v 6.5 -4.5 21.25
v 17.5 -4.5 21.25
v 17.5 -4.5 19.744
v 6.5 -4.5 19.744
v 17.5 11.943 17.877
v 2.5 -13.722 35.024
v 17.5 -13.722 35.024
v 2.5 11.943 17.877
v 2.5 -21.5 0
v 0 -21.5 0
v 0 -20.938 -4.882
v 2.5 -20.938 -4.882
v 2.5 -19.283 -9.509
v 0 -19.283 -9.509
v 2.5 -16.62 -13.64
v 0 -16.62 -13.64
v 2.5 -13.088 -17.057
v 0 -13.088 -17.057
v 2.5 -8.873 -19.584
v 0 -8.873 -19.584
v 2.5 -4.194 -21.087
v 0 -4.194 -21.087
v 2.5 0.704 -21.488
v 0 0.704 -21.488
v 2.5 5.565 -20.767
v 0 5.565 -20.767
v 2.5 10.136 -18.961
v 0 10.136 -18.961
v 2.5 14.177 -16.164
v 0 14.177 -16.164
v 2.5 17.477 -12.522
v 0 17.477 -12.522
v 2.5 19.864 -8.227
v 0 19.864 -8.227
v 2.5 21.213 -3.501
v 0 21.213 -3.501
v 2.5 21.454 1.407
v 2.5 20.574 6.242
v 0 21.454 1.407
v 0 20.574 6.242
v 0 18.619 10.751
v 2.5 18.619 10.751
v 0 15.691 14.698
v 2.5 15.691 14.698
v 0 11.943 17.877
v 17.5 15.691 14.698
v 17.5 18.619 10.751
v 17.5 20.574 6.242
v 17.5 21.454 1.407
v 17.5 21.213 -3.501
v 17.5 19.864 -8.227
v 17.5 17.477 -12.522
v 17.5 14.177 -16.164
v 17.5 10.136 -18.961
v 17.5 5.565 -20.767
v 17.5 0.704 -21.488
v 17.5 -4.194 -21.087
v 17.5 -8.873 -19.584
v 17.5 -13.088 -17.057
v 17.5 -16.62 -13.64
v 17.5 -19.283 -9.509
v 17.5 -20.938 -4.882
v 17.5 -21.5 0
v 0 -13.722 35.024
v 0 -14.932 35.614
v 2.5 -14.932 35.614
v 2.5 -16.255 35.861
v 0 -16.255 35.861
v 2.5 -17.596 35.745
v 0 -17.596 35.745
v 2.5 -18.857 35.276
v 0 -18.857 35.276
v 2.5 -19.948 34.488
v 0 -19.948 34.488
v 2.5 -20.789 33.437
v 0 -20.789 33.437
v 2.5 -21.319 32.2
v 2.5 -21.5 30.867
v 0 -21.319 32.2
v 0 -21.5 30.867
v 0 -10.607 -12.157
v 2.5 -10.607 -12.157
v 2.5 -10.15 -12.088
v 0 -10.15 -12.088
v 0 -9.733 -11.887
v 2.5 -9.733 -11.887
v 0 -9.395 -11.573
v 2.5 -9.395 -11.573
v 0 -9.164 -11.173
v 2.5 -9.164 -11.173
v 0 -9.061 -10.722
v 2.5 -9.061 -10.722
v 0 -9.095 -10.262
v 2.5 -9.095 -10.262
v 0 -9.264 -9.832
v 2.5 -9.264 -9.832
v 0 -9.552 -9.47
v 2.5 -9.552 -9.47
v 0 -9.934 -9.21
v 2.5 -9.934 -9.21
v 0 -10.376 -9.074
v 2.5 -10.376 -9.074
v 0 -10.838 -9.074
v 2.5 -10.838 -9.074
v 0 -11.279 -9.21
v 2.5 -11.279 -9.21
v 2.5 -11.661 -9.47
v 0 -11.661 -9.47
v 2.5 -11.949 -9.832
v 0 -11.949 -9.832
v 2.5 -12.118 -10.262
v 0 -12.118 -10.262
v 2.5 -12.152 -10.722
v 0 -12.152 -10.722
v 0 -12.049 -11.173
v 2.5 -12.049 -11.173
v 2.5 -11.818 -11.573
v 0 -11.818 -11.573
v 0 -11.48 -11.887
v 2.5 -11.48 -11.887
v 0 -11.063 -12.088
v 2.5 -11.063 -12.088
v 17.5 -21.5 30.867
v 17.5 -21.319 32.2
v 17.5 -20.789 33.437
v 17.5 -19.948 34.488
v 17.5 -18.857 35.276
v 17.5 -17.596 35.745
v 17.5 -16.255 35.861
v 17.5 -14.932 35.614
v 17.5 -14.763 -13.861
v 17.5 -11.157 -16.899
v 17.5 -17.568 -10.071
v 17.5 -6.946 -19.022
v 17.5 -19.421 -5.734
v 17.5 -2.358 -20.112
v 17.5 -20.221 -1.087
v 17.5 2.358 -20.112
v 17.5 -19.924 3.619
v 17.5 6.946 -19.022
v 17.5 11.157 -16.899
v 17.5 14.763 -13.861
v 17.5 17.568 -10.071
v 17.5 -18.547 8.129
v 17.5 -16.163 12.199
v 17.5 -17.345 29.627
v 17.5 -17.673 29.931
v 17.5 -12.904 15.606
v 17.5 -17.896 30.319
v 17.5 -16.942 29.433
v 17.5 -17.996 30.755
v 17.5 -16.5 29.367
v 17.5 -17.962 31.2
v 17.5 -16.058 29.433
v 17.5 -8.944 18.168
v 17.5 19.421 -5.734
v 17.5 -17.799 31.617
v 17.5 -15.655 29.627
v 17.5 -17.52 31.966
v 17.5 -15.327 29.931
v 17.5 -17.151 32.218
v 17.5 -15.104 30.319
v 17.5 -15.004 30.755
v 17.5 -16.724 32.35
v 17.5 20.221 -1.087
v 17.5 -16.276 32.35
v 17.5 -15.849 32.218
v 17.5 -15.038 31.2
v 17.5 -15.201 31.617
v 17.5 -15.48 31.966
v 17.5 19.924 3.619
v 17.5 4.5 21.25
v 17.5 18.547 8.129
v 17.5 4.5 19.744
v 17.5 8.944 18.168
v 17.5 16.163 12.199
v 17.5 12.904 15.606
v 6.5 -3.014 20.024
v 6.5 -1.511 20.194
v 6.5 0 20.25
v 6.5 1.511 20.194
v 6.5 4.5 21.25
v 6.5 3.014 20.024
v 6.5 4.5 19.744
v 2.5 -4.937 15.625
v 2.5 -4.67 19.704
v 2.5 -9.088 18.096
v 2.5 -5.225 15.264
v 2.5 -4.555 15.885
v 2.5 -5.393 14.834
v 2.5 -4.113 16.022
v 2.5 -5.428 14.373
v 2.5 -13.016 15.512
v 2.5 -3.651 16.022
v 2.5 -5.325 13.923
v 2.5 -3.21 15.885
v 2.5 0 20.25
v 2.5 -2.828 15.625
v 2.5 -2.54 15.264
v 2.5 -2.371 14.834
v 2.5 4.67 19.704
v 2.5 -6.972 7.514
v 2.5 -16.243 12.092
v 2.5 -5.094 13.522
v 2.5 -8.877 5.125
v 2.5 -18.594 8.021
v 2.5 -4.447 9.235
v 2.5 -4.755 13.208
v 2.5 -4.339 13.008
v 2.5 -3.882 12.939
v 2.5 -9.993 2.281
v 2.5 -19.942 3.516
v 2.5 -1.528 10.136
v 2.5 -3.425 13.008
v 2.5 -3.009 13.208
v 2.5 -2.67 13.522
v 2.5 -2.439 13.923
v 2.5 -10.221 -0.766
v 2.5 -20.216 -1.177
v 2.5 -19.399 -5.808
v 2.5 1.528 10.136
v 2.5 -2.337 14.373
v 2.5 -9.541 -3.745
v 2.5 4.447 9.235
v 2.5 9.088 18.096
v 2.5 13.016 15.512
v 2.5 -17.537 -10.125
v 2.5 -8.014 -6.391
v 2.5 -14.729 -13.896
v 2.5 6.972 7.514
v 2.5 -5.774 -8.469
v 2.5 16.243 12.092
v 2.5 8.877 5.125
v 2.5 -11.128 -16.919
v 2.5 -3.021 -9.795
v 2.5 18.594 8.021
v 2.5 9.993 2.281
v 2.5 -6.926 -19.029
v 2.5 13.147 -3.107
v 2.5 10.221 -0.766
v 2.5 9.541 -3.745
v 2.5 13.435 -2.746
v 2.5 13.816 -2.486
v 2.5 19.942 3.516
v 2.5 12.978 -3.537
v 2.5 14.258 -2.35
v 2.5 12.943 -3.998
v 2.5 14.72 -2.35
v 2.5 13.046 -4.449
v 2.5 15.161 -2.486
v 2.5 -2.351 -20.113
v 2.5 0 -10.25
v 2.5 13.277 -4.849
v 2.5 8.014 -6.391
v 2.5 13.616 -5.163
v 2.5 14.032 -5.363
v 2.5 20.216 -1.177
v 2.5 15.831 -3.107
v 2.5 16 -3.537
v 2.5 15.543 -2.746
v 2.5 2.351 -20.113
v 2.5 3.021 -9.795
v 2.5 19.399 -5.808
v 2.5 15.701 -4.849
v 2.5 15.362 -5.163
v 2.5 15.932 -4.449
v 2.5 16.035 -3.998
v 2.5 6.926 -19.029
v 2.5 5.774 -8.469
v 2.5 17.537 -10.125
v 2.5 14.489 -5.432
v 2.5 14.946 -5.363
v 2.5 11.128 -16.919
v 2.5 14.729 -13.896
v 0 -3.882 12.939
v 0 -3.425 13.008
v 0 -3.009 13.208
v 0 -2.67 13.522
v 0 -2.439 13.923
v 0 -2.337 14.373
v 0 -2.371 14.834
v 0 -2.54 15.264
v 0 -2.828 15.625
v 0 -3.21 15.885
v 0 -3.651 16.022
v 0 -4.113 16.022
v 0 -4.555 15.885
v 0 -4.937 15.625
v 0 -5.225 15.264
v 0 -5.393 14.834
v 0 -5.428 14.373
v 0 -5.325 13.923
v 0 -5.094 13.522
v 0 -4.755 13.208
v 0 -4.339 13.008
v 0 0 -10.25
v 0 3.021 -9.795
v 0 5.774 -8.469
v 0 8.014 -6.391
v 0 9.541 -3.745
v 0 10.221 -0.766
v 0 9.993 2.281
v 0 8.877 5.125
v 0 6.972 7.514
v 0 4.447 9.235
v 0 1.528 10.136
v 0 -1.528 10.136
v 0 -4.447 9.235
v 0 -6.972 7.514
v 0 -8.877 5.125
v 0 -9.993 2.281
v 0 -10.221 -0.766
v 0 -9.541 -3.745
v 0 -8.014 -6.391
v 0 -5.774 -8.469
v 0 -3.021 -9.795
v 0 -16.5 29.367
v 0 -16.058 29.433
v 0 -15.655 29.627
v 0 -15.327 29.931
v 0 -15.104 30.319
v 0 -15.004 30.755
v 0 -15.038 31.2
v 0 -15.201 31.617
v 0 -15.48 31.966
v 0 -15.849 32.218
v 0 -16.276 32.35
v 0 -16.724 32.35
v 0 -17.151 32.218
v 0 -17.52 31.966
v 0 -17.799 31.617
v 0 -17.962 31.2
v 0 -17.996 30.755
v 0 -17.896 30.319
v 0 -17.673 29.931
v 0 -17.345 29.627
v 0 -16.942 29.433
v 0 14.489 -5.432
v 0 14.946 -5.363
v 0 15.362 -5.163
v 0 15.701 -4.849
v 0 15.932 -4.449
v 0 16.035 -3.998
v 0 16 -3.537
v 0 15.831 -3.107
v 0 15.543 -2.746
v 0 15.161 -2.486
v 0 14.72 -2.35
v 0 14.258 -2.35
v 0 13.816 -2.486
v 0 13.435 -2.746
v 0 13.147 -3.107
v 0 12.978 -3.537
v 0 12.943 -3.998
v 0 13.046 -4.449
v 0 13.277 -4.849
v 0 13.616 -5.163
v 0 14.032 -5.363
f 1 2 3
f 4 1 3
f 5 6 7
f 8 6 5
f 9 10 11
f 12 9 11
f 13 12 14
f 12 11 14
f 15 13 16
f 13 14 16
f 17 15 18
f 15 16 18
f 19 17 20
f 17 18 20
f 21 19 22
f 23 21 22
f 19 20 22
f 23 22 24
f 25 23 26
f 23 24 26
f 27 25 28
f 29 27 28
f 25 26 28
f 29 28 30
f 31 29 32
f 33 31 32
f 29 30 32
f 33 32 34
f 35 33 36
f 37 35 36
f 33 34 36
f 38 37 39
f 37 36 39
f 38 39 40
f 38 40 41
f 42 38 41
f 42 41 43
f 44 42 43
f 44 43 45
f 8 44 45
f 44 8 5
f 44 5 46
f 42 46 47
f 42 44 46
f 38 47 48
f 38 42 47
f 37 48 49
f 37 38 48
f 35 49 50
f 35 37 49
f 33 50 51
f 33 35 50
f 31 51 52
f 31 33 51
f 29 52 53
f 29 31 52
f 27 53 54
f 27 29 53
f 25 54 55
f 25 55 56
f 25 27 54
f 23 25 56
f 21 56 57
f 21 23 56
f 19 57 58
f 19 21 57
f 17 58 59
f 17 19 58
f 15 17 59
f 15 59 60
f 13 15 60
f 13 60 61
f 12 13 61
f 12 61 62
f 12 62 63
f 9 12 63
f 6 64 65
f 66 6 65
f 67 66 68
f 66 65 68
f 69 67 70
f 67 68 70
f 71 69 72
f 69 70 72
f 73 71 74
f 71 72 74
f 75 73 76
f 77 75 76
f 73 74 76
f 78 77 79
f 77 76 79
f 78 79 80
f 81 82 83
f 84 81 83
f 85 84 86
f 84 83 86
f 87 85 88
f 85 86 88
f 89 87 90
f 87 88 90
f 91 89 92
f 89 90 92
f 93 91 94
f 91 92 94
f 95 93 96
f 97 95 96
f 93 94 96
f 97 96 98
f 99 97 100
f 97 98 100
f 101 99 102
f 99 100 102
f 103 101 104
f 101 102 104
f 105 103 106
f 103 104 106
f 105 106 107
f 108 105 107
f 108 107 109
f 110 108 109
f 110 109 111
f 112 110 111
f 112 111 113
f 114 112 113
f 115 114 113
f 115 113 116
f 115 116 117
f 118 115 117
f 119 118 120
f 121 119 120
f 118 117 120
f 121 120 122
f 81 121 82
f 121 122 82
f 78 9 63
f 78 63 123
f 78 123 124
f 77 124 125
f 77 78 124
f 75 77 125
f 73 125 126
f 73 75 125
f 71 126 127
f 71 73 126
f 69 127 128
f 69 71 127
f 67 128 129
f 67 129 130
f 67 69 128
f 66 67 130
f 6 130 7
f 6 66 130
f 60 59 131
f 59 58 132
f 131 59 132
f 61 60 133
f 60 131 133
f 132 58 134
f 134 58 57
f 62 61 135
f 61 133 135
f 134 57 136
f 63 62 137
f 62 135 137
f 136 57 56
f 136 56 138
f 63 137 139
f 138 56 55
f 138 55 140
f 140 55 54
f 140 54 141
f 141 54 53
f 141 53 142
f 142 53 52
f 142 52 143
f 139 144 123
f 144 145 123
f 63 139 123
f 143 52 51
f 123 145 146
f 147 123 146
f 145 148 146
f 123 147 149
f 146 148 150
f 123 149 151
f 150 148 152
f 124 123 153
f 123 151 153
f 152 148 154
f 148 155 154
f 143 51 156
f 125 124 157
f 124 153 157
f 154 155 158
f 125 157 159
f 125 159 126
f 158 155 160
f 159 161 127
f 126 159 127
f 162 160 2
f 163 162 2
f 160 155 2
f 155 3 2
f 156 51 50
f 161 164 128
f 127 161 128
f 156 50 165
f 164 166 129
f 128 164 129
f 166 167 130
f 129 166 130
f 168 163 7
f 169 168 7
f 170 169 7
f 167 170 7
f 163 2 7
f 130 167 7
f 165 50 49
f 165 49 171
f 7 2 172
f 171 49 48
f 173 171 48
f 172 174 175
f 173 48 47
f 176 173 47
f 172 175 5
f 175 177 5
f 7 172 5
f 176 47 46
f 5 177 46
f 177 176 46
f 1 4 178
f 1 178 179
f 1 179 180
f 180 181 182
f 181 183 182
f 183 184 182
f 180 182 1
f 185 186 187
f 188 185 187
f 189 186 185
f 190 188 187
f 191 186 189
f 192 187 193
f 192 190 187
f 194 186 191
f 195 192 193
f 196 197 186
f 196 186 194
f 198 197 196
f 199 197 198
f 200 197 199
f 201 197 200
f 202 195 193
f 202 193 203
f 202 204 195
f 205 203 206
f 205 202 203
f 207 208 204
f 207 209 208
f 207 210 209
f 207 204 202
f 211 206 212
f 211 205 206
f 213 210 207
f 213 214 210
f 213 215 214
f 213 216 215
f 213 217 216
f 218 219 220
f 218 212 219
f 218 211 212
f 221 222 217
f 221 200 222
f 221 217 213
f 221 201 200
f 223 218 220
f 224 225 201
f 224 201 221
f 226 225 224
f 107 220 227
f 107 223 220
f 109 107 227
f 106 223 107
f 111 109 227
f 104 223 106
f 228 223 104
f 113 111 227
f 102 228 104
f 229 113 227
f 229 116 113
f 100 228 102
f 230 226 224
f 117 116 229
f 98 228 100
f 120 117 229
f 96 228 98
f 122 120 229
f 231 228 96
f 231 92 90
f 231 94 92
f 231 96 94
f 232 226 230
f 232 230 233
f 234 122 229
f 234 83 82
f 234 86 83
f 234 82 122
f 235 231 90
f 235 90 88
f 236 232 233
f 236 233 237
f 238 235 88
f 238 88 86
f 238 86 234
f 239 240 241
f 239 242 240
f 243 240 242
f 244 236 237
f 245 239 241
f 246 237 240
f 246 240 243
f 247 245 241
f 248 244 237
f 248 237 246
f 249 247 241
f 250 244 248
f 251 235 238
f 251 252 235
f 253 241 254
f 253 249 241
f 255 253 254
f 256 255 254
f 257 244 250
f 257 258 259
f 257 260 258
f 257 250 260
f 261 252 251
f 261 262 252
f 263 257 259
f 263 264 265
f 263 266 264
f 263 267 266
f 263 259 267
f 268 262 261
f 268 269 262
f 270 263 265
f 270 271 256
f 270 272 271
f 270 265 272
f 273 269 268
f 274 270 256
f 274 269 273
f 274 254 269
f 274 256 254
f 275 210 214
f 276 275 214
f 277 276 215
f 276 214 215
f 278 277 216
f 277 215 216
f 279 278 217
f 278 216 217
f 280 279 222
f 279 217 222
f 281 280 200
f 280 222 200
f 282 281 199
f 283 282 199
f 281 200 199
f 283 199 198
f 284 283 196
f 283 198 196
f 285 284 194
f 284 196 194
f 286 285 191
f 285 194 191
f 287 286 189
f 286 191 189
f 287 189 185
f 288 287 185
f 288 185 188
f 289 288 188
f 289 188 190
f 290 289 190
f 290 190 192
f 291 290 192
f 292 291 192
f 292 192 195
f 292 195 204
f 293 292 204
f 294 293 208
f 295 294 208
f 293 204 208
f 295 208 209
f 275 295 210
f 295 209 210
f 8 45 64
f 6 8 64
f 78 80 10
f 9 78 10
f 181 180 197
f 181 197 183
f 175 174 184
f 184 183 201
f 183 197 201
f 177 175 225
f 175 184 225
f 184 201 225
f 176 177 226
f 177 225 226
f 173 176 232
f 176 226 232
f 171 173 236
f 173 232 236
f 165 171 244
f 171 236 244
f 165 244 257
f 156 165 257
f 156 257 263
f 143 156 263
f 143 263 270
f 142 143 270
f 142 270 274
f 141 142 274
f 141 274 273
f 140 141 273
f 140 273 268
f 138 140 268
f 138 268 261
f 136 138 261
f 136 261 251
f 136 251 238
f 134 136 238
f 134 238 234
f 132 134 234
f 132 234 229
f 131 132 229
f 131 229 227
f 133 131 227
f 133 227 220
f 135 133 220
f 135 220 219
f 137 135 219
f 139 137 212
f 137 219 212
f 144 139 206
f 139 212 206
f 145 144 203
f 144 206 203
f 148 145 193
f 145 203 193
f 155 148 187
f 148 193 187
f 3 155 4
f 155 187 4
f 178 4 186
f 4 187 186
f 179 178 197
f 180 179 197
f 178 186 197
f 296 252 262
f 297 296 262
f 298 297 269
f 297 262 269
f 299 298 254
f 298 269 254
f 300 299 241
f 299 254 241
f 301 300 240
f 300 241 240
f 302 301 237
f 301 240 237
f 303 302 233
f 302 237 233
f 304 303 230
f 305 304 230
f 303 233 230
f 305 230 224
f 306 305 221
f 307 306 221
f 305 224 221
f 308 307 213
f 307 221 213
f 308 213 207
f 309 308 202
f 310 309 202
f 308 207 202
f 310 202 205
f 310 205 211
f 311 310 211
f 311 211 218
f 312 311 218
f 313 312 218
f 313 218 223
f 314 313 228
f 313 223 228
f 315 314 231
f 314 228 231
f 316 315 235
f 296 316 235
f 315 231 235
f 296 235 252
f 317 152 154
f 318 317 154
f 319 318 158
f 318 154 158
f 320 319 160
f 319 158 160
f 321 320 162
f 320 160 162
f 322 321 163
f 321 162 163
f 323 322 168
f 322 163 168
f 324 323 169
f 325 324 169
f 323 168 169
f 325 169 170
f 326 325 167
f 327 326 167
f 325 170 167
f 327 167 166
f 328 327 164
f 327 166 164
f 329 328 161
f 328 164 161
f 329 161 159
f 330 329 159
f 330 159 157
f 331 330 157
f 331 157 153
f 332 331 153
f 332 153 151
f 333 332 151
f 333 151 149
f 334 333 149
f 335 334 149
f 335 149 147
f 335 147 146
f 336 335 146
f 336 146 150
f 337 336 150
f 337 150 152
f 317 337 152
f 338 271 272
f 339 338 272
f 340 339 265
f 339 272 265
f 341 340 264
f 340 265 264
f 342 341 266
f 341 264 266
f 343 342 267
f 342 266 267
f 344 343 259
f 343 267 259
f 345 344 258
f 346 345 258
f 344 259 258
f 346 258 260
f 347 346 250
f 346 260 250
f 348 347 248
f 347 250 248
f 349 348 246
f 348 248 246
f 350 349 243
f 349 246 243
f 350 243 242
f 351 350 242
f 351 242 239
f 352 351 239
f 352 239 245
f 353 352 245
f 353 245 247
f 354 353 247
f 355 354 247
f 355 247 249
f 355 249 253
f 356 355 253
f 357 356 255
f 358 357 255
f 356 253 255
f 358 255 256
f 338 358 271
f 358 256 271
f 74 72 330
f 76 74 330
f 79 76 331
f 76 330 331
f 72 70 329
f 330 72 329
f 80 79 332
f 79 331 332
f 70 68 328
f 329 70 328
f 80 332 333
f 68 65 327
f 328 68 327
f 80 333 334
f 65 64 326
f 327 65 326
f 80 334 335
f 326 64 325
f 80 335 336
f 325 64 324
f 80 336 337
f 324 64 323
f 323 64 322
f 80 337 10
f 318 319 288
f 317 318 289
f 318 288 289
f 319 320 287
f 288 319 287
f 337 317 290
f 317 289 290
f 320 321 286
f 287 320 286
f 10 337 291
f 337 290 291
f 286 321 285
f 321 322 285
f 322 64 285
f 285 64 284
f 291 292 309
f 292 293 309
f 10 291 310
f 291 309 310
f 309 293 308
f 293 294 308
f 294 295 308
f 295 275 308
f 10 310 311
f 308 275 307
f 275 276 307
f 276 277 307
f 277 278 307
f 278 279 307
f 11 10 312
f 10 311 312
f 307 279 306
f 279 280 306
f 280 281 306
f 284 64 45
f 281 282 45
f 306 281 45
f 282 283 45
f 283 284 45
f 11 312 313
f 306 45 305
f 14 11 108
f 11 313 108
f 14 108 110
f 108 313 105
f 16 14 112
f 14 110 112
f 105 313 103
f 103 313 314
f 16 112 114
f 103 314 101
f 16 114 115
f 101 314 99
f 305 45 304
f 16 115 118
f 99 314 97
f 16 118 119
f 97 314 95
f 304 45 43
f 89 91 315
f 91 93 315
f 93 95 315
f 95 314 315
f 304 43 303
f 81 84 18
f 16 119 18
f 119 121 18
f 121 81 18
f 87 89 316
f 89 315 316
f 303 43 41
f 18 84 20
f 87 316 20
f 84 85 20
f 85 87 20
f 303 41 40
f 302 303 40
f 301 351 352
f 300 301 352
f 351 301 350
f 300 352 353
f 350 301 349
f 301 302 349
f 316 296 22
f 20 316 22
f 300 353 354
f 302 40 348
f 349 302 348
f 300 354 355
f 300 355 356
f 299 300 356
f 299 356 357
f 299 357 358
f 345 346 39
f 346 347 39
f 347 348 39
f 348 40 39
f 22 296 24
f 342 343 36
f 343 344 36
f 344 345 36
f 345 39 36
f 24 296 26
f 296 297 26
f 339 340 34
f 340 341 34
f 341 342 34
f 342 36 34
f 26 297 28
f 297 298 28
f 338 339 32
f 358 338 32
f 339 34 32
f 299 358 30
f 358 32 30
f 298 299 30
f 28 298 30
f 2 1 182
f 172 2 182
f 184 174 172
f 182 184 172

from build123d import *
from build123d.topology import SkipClean

# Parameters (mm, degrees)
EXTRUDE_1_DEPTH     = 2.5
SKETCH_3_R          = 10.25
SKETCH_3_R_2        = 1.55
CUT_EXTRUDE_1_DEPTH = 2.5
SKETCH_2_R          = 20.25
EXTRUDE_2_DEPTH     = 15
SKETCH_4_R          = 1.5
CUT_EXTRUDE_2_DEPTH = 46.33118669
CUT_EXTRUDE_3_DEPTH = 11


with BuildPart() as part:
    # Эскиз1 → Бобышка-Вытянуть1 (new body)
    with BuildSketch(Plane(origin=(0, 0, 0), x_dir=(0, 0, -1), z_dir=(1, 0, 0))):
        with BuildLine():
            Line((-30.866648668, -21.5), (0, -21.5))
            ThreePointArc((0, -21.5), (18.960941325, 10.135714286), (-17.877458963, 11.943469388))
            Line((-17.877458963, 11.943469388), (-35.024197264, -13.72244898))
            ThreePointArc((-35.024197264, -13.72244898), (-35.276169906, -18.857142857), (-30.866648668, -21.5))
        make_face()
    extrude(amount=EXTRUDE_1_DEPTH)

    # Эскиз3 → Вырез-Вытянуть1 (cut)
    with BuildSketch(Plane(origin=(2.5, 0, 0), x_dir=(0, 0, -1), z_dir=(1, 0, 0))):
        Circle(SKETCH_3_R)
        with Locations((3.882285677, 14.488887394)):
            Circle(SKETCH_3_R_2)
        with Locations((10.606601718, -10.606601718)):
            Circle(SKETCH_3_R_2)
        with Locations((-14.488887394, -3.882285677)):
            Circle(SKETCH_3_R_2)
    extrude(amount=-CUT_EXTRUDE_1_DEPTH, mode=Mode.SUBTRACT)

    # Эскиз2 → Бобышка-Вытянуть2 (add)
    with SkipClean():  # the faces are left unmerged after this step: merging them gives an invalid solid
        with BuildSketch(Plane.ZY.offset(-2.5)):
            with BuildLine():
                Line((0, -21.5), (30.866648668, -21.5))
                ThreePointArc((30.866648668, -21.5), (35.276169906, -18.857142857), (35.024197264, -13.72244898))
                Line((35.024197264, -13.72244898), (17.877458963, 11.943469388))
                ThreePointArc((17.877458963, 11.943469388), (-18.960941325, 10.135714286), (0, -21.5))
            make_face()
            Circle(SKETCH_2_R, mode=Mode.SUBTRACT)
        extrude(amount=-EXTRUDE_2_DEPTH)

    # Эскиз4 → Вырез-Вытянуть2 (cut, through all)
    with SkipClean():  # the faces are left unmerged after this step: merging them gives an invalid solid
        with BuildSketch(Plane(origin=(17.5, 0, 0), x_dir=(0, 0, -1), z_dir=(1, 0, 0))):
            with Locations((-30.866648668, -16.5)):
                Circle(SKETCH_4_R)
        extrude(amount=-CUT_EXTRUDE_2_DEPTH, mode=Mode.SUBTRACT)

    # Эскиз5 → Вырез-Вытянуть3 (cut)
    with SkipClean():  # the faces are left unmerged after this step: merging them gives an invalid solid
        with BuildSketch(Plane(origin=(17.5, 0, 0), x_dir=(0, 0, -1), z_dir=(1, 0, 0))):
            Polygon((-20.25, 4.5), (-19.743669872, 4.5), (-19.743669872, -4.5), (-20.25, -4.5), (-21.25, -4.5), (-21.25, 4.5), align=None)
        extrude(amount=-CUT_EXTRUDE_3_DEPTH, mode=Mode.SUBTRACT)


solid = part.part
